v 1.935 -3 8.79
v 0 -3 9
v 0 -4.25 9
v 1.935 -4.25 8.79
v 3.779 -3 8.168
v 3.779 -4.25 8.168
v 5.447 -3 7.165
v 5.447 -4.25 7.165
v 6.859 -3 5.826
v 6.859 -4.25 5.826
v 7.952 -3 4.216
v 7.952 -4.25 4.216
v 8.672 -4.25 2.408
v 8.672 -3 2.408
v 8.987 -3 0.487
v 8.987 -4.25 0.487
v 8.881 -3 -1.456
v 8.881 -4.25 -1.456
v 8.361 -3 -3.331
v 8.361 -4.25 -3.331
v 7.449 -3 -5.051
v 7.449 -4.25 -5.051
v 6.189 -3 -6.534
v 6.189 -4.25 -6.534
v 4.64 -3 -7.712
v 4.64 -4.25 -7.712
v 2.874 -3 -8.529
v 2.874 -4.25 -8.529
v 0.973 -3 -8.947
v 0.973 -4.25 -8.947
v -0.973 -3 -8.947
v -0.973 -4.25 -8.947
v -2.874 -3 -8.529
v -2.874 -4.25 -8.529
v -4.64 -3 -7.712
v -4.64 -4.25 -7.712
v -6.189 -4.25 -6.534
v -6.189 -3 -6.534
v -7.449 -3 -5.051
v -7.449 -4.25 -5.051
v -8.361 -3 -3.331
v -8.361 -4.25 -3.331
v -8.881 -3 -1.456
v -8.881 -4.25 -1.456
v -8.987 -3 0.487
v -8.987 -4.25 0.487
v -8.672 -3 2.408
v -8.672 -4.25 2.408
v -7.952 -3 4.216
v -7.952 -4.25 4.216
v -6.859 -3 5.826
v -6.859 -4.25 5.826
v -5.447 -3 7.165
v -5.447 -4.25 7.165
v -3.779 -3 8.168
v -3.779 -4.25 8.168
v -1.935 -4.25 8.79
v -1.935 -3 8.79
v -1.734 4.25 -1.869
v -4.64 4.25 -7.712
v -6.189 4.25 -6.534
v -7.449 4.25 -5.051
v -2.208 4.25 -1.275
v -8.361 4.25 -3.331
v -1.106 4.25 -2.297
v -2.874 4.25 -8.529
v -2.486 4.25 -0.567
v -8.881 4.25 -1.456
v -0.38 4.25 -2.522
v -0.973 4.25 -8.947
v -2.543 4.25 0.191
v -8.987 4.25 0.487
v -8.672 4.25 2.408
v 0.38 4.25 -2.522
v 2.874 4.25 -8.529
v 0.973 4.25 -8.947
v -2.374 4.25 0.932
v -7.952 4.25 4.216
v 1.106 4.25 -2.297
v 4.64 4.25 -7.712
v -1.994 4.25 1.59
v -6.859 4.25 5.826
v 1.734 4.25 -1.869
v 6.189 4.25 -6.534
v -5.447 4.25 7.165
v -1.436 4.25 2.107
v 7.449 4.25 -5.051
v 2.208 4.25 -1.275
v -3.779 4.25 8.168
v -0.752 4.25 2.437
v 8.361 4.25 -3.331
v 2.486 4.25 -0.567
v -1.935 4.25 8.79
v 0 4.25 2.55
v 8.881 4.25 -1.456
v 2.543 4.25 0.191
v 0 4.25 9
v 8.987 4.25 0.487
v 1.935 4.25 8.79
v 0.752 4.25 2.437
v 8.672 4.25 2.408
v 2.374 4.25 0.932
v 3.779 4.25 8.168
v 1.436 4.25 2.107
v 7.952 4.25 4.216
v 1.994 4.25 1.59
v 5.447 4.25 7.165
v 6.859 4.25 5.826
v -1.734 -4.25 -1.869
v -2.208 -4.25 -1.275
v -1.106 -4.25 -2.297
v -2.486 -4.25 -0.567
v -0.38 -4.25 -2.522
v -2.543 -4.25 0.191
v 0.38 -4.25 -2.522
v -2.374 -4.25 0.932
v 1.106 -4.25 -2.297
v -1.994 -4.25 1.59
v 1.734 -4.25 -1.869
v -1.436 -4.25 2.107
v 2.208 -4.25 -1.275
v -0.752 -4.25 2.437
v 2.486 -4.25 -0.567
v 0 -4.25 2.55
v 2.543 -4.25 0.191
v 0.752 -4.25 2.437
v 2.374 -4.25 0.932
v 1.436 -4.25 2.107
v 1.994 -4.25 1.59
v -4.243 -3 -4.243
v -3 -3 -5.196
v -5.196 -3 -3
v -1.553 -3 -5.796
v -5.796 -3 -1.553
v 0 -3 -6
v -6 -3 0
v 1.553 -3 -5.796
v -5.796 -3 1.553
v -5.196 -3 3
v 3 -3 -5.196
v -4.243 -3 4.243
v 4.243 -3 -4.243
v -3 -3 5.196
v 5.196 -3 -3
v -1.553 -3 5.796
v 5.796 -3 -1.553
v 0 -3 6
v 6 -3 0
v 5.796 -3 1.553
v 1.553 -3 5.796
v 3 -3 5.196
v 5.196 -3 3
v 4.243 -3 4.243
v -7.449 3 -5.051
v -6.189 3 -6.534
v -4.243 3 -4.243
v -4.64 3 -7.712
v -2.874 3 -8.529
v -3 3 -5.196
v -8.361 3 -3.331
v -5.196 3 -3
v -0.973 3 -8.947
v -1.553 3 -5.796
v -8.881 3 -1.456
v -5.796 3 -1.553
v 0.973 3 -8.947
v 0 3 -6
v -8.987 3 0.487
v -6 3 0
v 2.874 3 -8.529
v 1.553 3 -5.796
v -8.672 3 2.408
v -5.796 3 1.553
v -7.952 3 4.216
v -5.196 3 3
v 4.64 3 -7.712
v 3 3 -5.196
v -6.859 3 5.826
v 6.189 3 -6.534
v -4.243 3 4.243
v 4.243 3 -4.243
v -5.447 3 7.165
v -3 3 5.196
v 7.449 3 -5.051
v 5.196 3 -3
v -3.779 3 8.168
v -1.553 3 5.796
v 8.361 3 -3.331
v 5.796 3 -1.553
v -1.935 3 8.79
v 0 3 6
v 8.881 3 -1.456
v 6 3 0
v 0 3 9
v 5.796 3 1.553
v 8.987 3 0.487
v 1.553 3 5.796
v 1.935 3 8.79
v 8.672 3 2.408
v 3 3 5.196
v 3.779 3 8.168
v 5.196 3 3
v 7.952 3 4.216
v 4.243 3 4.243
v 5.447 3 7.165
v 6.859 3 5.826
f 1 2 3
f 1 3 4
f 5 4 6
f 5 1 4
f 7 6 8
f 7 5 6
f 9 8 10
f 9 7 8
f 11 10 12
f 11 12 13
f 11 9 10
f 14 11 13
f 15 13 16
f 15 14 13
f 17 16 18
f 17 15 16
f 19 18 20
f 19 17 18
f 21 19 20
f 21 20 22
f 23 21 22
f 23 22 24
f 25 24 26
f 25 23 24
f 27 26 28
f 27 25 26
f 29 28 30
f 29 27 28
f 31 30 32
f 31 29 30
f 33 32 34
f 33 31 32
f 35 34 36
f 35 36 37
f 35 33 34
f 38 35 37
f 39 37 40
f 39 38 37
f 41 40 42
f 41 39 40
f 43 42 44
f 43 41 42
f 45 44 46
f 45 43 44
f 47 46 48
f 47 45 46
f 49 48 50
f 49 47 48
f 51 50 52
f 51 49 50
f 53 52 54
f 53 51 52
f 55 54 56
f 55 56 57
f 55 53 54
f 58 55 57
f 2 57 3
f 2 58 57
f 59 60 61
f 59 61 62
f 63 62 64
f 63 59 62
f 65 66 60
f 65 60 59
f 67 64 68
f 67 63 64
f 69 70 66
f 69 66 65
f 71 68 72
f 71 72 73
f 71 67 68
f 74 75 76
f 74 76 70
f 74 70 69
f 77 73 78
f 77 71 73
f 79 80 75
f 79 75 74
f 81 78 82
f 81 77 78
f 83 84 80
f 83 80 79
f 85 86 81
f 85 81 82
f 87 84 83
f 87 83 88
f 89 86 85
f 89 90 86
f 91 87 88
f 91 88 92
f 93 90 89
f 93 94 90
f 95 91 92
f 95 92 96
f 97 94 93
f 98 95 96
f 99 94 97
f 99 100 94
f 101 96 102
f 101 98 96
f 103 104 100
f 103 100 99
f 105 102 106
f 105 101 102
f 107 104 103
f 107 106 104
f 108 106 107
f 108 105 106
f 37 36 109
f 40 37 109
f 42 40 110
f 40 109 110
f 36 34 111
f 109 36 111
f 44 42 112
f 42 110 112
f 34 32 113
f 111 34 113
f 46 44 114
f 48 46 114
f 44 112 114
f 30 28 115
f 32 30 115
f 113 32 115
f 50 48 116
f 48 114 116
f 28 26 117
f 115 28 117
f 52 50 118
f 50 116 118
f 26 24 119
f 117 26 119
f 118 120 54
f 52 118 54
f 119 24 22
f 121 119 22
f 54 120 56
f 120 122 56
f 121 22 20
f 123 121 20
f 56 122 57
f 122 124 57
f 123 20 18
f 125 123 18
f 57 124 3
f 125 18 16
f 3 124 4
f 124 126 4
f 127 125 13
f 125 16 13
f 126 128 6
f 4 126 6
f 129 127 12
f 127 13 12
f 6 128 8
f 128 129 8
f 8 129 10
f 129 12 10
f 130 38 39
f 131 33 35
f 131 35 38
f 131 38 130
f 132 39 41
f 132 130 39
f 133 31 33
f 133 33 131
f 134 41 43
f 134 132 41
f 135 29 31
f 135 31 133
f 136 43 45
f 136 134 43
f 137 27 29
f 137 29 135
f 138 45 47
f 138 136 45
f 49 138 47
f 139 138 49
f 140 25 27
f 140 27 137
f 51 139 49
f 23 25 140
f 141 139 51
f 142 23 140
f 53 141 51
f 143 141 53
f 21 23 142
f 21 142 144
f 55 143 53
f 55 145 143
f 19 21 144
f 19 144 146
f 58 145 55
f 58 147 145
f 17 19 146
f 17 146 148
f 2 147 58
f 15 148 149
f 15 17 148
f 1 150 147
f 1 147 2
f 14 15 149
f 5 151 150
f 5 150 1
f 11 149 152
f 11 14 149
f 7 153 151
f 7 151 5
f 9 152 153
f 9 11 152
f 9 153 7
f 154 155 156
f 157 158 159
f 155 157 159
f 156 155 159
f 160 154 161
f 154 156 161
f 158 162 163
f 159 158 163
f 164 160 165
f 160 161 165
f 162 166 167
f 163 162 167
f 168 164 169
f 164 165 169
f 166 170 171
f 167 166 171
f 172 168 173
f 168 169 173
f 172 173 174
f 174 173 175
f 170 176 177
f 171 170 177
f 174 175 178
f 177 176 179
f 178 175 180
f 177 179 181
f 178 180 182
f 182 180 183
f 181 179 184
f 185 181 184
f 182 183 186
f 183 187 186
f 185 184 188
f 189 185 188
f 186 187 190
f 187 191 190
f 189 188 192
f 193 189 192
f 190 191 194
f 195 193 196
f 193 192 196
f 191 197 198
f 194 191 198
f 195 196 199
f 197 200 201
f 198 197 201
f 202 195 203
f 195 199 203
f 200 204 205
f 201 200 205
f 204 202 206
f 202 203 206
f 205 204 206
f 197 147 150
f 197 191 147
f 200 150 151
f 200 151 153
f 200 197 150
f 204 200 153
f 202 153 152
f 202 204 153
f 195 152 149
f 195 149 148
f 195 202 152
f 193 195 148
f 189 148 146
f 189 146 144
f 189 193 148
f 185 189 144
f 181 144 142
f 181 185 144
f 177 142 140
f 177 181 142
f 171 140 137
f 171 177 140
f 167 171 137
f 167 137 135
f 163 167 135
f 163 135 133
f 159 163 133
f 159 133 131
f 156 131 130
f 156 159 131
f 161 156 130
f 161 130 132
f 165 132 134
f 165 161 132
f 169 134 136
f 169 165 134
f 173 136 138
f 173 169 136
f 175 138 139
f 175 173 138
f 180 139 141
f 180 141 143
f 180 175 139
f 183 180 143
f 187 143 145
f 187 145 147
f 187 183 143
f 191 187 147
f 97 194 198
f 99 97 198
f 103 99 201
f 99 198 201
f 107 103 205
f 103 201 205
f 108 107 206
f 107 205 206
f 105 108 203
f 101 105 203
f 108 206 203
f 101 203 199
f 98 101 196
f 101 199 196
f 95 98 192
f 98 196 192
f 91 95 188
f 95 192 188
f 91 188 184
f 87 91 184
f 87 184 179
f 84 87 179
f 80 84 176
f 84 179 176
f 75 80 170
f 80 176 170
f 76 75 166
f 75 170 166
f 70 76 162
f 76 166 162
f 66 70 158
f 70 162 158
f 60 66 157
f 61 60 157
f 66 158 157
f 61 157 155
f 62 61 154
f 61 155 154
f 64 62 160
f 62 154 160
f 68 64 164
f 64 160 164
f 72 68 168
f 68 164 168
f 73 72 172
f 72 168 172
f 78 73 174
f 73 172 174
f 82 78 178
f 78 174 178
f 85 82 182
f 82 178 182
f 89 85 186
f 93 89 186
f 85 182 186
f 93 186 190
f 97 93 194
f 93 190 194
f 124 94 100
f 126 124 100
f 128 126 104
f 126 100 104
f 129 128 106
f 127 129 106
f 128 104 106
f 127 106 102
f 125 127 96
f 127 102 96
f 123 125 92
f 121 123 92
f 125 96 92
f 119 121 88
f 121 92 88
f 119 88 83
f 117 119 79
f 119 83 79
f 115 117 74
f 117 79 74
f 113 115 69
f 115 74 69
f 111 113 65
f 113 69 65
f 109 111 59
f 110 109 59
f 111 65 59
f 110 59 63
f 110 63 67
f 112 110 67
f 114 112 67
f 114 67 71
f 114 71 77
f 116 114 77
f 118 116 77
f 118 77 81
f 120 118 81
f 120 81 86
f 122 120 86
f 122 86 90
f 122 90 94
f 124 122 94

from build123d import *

# Parameters (mm, degrees)
SKETCH_1_R          = 6
EXTRUDE_1_DEPTH     = 3
SKETCH_3_R          = 9
EXTRUDE_2_DEPTH     = 1.25
SKETCH_4_R          = 2.55
CUT_EXTRUDE_1_DEPTH = 16.305227865


with BuildPart() as part:
    # 草图1 → 凸台-拉伸1 (new, symmetric)
    with BuildSketch(Plane(origin=(0, 0, 0), x_dir=(1, 0, 0), z_dir=(0, 1, 0))):
        with Locations(Location((0, 0, 0), (0, 0, 270))):
            Circle(SKETCH_1_R)
    extrude(amount=EXTRUDE_1_DEPTH, both=True)

    # 草图3 → 凸台-拉伸2 (add)
    with BuildSketch(Plane(origin=(0, 3, 0), x_dir=(1, 0, 0), z_dir=(0, 1, 0))):
        with Locations(Location((0, 0, 0), (0, 0, 270))):
            Circle(SKETCH_3_R)
    extrude_2 = extrude(amount=EXTRUDE_2_DEPTH)

    # 镜向1: 凸台-拉伸2 across plane
    add(extrude_2.mirror(Plane.ZX))

    # 草图4 → 切除-拉伸1 (cut, through all)
    with BuildSketch(Plane(origin=(0, 4.25, 0), x_dir=(1, 0, 0), z_dir=(0, 1, 0))):
        with Locations(Location((0, 0, 0), (0, 0, 270))):
            Circle(SKETCH_4_R)
    extrude(amount=-CUT_EXTRUDE_1_DEPTH, mode=Mode.SUBTRACT)


solid = part.part
